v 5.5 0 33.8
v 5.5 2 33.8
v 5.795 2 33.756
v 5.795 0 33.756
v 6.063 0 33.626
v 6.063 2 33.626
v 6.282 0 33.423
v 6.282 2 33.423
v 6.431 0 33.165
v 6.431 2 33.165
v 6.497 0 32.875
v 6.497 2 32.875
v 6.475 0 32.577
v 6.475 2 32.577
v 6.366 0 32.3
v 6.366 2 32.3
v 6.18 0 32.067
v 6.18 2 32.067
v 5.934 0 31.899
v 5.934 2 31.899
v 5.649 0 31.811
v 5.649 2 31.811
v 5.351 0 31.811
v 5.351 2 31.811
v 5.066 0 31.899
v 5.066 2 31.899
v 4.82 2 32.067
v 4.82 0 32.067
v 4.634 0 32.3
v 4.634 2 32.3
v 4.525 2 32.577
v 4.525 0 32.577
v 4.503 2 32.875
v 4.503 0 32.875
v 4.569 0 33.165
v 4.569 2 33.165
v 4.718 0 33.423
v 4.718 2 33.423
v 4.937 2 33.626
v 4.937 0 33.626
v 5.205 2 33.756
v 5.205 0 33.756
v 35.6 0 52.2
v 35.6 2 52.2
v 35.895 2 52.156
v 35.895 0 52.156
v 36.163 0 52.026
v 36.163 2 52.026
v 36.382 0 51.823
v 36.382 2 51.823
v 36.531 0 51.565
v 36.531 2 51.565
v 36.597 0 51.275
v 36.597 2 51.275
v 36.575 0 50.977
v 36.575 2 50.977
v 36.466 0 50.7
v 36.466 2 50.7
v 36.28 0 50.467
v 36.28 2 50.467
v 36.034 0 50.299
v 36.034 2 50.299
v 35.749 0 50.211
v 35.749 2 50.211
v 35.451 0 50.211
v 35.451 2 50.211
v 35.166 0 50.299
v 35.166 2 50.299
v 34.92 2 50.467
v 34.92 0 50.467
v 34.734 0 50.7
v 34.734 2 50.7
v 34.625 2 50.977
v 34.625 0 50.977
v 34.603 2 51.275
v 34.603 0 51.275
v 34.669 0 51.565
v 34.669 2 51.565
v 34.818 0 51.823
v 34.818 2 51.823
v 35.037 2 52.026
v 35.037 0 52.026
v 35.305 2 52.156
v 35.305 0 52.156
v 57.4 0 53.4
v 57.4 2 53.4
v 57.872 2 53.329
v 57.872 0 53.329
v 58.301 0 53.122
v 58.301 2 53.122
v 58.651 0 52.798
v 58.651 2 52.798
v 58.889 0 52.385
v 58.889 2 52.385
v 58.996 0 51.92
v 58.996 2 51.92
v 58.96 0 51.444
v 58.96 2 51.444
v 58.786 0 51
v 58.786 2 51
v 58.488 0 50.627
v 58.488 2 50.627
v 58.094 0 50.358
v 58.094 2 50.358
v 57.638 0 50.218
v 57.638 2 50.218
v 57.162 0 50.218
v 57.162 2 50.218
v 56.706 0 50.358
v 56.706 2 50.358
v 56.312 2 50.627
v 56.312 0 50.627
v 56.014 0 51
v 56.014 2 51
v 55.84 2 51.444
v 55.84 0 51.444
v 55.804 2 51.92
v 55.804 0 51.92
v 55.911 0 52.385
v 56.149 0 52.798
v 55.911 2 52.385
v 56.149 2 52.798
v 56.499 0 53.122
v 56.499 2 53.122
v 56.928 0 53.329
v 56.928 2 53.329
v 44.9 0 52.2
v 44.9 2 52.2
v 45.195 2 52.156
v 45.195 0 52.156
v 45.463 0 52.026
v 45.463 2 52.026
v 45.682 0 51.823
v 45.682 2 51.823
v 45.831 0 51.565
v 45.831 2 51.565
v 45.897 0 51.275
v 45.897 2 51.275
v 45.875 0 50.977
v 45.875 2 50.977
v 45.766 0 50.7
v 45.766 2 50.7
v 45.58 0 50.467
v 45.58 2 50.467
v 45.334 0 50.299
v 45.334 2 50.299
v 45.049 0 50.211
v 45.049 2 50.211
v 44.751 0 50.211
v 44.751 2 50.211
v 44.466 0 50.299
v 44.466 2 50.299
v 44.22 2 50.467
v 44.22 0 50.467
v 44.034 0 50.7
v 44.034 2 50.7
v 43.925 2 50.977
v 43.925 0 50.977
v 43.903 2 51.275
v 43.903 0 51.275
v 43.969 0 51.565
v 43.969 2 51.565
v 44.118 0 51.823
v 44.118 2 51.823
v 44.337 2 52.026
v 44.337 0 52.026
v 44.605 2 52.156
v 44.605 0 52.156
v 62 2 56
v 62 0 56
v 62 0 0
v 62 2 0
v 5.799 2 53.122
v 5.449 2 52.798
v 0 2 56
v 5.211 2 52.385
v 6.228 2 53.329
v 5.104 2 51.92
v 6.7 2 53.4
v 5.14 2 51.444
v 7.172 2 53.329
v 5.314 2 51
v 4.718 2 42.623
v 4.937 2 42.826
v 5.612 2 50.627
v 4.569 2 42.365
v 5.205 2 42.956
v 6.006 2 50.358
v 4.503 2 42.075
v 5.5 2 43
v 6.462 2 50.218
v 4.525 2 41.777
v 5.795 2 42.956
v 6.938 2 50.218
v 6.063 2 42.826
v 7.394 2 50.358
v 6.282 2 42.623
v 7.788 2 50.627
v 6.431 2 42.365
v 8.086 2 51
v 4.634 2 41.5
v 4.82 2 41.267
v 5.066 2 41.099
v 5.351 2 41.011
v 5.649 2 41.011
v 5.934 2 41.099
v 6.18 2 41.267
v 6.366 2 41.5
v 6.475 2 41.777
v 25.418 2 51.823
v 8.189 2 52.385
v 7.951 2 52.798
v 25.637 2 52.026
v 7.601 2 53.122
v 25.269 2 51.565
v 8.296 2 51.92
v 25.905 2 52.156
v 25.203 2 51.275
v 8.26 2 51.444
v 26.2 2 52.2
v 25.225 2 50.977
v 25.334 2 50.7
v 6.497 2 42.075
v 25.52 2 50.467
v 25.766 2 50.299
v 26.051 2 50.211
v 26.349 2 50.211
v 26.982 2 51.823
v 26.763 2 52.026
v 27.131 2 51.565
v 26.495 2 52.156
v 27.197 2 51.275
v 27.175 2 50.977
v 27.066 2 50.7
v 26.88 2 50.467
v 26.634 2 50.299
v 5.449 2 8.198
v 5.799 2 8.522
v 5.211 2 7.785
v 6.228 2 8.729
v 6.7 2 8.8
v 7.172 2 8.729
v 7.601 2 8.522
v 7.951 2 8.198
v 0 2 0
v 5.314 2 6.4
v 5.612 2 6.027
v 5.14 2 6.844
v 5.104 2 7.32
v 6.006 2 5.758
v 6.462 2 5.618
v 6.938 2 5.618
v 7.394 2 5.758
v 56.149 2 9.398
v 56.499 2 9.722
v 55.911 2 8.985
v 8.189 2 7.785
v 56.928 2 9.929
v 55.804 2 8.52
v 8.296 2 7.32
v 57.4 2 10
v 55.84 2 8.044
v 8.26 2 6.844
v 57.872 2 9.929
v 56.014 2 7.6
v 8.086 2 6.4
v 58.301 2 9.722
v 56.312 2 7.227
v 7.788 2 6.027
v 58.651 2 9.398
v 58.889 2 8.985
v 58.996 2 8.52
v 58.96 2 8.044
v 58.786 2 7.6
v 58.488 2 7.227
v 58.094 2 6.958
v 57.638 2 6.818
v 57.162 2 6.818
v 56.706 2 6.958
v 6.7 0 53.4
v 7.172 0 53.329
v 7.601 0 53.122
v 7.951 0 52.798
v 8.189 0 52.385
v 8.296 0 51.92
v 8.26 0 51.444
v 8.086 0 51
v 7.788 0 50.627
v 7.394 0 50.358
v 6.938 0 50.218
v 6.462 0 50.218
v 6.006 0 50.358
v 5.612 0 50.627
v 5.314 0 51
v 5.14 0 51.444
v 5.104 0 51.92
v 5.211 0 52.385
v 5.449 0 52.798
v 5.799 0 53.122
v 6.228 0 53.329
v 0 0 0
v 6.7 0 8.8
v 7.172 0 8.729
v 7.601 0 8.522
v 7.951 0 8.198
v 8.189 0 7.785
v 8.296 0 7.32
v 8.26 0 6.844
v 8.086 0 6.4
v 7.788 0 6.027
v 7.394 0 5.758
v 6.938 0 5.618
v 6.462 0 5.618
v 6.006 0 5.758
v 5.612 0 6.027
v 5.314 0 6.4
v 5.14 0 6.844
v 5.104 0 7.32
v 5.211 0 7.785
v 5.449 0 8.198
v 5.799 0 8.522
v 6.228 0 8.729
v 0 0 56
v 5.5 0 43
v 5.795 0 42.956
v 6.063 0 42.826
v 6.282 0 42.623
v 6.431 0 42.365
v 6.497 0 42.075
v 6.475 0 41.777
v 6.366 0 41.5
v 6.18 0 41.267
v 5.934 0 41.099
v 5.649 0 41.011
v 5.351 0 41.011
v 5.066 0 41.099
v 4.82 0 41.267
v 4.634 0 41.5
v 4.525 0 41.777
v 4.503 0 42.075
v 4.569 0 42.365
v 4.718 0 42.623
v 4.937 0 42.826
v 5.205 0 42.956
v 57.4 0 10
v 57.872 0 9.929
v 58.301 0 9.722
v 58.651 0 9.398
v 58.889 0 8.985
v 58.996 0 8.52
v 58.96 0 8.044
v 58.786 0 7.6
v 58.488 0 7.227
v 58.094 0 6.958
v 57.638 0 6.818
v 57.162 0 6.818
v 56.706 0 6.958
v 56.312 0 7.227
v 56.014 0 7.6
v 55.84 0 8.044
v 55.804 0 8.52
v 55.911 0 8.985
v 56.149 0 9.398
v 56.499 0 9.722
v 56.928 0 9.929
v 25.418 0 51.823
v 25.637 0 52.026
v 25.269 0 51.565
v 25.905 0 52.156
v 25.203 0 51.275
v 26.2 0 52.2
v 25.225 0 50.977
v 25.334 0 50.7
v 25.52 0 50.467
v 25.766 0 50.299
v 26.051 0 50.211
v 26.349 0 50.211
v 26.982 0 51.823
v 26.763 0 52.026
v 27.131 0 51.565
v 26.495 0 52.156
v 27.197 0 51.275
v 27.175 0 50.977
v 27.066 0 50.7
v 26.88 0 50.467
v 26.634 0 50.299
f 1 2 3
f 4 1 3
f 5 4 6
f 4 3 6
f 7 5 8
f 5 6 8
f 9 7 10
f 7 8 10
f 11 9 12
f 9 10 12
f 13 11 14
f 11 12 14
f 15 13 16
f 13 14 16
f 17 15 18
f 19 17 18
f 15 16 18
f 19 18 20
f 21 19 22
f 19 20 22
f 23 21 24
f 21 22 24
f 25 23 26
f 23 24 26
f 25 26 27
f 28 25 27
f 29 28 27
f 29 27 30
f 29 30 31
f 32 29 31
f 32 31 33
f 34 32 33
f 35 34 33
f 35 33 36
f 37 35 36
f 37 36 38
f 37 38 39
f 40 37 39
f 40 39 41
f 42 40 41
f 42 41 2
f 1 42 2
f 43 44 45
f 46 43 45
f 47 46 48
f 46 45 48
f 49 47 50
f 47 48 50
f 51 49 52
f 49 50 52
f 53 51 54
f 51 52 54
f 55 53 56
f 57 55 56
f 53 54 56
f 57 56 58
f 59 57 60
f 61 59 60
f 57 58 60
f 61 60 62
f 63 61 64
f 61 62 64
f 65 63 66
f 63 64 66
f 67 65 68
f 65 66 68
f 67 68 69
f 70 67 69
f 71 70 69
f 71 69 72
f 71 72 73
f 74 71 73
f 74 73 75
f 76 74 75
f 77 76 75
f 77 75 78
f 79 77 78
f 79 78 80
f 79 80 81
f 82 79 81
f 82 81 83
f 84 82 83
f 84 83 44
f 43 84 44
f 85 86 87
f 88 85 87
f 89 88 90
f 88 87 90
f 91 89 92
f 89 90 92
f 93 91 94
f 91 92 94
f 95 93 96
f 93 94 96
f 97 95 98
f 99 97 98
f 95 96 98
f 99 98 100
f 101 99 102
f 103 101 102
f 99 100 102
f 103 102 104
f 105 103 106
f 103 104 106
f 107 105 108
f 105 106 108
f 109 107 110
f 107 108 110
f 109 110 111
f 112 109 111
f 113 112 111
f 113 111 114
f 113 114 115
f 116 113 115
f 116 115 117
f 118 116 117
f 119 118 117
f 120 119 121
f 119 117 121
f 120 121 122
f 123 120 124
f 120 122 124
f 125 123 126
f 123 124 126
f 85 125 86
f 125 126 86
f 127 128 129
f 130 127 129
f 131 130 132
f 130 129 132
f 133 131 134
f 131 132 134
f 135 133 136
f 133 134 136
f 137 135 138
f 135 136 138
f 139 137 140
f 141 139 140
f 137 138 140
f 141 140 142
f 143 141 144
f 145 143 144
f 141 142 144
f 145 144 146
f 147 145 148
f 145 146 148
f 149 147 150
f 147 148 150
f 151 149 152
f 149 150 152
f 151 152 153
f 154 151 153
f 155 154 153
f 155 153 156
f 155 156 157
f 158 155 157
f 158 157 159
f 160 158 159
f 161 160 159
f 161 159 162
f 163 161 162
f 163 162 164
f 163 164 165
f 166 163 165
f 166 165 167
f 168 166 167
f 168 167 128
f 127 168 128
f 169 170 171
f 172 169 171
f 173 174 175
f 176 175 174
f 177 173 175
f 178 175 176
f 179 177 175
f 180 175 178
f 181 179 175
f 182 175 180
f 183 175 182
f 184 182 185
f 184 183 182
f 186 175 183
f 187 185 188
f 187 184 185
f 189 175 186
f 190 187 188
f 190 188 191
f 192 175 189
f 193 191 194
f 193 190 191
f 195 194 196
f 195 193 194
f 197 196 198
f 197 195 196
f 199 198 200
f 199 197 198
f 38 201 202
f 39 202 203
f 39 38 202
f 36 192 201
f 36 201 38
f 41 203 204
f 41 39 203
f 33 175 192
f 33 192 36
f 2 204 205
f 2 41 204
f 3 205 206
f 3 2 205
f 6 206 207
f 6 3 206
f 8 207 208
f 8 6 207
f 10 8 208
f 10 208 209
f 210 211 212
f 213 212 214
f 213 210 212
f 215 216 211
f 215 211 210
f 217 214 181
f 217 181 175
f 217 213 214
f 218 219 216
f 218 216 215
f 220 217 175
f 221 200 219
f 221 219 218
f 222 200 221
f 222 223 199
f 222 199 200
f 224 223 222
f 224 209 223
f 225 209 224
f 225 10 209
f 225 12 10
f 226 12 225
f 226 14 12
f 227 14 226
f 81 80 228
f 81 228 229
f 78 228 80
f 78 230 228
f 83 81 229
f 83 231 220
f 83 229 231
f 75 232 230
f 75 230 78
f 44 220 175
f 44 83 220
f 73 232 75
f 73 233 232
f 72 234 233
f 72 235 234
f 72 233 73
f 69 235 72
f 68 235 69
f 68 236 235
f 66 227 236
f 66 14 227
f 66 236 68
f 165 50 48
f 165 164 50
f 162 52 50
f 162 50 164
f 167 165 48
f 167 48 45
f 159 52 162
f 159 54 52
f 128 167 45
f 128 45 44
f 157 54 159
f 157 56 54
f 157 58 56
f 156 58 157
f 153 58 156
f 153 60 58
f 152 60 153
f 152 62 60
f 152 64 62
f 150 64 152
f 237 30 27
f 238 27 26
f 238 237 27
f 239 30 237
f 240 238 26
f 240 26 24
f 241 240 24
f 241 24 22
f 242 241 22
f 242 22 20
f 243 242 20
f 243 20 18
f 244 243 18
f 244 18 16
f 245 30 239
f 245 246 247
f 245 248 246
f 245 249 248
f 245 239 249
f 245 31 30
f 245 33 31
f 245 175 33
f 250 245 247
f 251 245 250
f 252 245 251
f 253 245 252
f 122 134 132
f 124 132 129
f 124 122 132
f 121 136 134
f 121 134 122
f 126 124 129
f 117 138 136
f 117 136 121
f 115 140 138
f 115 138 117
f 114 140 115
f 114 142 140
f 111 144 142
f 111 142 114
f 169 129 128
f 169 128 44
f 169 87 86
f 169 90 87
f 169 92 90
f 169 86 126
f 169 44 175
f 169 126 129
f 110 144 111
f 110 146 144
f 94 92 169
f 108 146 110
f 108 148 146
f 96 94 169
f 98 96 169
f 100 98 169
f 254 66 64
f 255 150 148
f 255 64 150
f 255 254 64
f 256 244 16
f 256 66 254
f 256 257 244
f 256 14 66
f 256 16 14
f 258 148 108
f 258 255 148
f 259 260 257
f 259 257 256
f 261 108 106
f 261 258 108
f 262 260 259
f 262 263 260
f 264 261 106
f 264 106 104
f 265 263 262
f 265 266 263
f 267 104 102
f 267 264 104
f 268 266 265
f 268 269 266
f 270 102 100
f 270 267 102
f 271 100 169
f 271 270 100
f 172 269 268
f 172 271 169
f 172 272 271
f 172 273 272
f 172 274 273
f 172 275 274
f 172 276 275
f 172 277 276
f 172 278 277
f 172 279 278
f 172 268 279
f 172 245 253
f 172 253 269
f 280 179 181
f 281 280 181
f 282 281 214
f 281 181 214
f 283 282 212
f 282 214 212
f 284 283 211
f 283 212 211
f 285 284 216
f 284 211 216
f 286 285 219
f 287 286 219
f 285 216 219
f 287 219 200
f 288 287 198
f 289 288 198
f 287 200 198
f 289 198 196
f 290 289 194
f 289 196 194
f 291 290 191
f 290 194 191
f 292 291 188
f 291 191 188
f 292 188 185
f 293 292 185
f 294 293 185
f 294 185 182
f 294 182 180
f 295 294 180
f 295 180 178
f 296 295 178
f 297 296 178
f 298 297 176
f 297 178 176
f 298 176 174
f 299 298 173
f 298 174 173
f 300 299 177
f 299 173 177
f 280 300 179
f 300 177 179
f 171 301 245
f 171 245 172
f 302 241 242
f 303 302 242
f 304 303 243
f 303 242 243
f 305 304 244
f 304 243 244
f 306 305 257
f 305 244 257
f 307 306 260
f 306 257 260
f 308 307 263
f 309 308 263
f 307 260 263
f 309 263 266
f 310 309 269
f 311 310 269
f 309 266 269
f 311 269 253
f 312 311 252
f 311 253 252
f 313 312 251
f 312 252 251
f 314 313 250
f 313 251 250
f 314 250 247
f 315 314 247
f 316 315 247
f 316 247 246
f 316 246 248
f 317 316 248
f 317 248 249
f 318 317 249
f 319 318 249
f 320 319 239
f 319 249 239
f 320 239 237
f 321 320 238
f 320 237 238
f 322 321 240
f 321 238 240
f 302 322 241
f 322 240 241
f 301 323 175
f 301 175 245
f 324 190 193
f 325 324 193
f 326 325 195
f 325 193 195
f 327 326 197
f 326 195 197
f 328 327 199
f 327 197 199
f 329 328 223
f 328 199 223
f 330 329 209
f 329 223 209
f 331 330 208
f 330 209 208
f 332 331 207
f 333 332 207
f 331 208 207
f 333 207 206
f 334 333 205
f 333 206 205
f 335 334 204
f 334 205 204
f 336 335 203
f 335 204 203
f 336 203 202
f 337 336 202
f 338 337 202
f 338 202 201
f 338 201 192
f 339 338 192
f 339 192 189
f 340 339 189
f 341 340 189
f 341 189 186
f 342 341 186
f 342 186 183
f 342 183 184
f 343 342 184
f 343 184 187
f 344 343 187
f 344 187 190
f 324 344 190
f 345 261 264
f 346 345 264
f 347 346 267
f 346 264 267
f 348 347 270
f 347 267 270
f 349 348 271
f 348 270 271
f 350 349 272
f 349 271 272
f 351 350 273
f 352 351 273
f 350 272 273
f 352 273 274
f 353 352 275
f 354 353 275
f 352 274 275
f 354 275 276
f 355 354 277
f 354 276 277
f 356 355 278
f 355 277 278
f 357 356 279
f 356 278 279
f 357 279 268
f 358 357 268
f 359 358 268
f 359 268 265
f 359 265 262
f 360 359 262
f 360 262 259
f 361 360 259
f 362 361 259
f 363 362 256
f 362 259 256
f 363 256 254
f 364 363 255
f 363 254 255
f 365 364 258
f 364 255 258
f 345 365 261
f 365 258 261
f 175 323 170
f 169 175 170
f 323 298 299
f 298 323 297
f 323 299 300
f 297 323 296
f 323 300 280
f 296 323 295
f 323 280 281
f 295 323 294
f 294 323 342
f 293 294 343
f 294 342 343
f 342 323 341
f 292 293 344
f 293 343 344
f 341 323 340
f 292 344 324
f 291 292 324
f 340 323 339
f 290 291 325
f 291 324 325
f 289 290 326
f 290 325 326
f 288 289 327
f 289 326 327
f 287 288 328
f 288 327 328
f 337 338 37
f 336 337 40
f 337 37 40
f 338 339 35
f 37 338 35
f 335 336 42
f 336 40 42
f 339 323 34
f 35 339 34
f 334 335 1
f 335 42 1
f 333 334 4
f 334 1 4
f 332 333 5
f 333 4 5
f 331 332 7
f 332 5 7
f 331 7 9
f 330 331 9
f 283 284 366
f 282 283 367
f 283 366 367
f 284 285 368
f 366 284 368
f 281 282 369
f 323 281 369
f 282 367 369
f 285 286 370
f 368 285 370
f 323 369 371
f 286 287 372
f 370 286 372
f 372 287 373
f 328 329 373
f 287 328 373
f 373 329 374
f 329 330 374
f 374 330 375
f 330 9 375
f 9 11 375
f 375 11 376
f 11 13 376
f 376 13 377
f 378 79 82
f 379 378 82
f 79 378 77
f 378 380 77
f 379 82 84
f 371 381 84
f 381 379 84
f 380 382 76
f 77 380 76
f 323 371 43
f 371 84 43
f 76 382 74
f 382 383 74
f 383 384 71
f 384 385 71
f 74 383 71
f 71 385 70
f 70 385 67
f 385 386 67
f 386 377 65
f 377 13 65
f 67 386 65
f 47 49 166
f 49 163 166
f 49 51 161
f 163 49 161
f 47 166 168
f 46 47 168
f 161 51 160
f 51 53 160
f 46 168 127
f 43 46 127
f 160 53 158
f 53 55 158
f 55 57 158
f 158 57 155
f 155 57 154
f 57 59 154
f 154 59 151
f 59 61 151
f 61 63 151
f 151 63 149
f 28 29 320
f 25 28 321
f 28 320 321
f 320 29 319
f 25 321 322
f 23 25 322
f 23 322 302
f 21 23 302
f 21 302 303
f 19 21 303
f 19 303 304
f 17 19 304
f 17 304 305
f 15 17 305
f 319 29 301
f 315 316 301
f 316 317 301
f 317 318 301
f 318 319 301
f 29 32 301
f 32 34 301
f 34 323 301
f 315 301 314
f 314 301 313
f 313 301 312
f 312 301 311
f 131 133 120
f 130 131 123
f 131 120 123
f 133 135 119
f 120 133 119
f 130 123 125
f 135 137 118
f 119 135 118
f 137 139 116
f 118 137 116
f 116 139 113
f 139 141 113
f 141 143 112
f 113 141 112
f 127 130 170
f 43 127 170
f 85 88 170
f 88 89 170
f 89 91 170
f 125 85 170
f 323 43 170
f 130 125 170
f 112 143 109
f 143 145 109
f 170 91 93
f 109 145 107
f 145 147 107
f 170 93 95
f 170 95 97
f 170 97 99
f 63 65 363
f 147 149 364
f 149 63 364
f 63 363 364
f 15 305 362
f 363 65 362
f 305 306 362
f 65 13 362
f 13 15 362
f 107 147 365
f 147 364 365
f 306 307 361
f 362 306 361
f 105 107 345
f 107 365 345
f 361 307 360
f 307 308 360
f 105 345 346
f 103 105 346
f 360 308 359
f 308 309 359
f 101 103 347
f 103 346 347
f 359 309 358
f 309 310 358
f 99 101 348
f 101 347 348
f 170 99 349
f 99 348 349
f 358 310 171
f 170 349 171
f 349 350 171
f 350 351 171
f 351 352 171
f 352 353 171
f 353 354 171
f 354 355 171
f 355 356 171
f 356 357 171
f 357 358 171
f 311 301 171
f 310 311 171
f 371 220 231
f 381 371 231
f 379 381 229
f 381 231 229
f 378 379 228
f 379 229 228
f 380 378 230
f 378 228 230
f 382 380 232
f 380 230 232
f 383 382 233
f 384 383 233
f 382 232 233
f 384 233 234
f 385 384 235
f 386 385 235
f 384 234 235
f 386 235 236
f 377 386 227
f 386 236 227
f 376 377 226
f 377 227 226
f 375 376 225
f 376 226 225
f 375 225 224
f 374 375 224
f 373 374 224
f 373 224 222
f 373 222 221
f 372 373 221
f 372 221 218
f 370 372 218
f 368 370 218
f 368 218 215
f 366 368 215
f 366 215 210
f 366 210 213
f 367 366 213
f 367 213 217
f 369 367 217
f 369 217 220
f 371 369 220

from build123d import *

# Parameters (mm, degrees)
SKETCH_1_W          = 62
SKETCH_1_H          = 56
EXTRUDE_1_DEPTH     = 2
SKETCH_2_R          = 1.6
CUT_EXTRUDE_1_DEPTH = 2
SKETCH_3_R          = 1
CUT_EXTRUDE_2_DEPTH = 84.570329663


with BuildPart() as part:
    # Эскиз1 → Бобышка-Вытянуть1 (new body)
    with BuildSketch(Plane(origin=(0, 0, 0), x_dir=(1, 0, 0), z_dir=(0, 1, 0))):
        with Locations((31, -28)):
            Rectangle(SKETCH_1_W, SKETCH_1_H)
    extrude(amount=EXTRUDE_1_DEPTH)

    # Эскиз2 → Вырез-Вытянуть1 (cut)
    with BuildSketch(Plane(origin=(0, 2, 0), x_dir=(1, 0, 0), z_dir=(0, 1, 0))):
        with Locations(Location((6.7, -7.2, 0), (0, 0, 270))):
            Circle(SKETCH_2_R)
        with Locations(Location((6.7, -51.8, 0), (0, 0, 270))):
            Circle(SKETCH_2_R)
        with Locations(Location((57.4, -51.8, 0), (0, 0, 270))):
            Circle(SKETCH_2_R)
        with Locations(Location((57.4, -8.4, 0), (0, 0, 270))):
            Circle(SKETCH_2_R)
    extrude(amount=-CUT_EXTRUDE_1_DEPTH, mode=Mode.SUBTRACT)

    # Эскиз3 → Вырез-Вытянуть2 (cut, through all)
    with BuildSketch(Plane(origin=(0, 2, 0), x_dir=(1, 0, 0), z_dir=(0, 1, 0))):
        with Locations(Location((5.5, -32.8, 0), (0, 0, 270))):
            Circle(SKETCH_3_R)
        with Locations(Location((5.5, -42, 0), (0, 0, 270))):
            Circle(SKETCH_3_R)
        with Locations(Location((26.2, -51.2, 0), (0, 0, 270))):
            Circle(SKETCH_3_R)
        with Locations(Location((35.6, -51.2, 0), (0, 0, 270))):
            Circle(SKETCH_3_R)
        with Locations(Location((44.9, -51.2, 0), (0, 0, 270))):
            Circle(SKETCH_3_R)
    extrude(amount=-CUT_EXTRUDE_2_DEPTH, mode=Mode.SUBTRACT)


solid = part.part
